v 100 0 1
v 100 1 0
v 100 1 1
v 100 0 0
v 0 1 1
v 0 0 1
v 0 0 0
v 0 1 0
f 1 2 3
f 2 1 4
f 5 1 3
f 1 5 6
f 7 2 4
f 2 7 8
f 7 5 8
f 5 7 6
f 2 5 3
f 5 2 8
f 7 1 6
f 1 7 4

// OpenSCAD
function minAngleDist(a,b)= 
 
      (2*((b - a) % 360)) % 360 - ((b - a) % 360);
 
function lerp_angle(a,b,bias) =
     a +   ((2*((b - a) % 360)) % 360 - ((b - a) % 360))*bias;


A=($t*3800)%360;
B=(A*7)%360;
echo(A,lerp_angle(A,B,0.5),B);
color("Red")rotate(A)cube([100,1,1]);
color("Blue")rotate(B)cube([100,1,1]);
color("Green")rotate(lerp_angle(A,B,0.5))cube([100,1,1]);
